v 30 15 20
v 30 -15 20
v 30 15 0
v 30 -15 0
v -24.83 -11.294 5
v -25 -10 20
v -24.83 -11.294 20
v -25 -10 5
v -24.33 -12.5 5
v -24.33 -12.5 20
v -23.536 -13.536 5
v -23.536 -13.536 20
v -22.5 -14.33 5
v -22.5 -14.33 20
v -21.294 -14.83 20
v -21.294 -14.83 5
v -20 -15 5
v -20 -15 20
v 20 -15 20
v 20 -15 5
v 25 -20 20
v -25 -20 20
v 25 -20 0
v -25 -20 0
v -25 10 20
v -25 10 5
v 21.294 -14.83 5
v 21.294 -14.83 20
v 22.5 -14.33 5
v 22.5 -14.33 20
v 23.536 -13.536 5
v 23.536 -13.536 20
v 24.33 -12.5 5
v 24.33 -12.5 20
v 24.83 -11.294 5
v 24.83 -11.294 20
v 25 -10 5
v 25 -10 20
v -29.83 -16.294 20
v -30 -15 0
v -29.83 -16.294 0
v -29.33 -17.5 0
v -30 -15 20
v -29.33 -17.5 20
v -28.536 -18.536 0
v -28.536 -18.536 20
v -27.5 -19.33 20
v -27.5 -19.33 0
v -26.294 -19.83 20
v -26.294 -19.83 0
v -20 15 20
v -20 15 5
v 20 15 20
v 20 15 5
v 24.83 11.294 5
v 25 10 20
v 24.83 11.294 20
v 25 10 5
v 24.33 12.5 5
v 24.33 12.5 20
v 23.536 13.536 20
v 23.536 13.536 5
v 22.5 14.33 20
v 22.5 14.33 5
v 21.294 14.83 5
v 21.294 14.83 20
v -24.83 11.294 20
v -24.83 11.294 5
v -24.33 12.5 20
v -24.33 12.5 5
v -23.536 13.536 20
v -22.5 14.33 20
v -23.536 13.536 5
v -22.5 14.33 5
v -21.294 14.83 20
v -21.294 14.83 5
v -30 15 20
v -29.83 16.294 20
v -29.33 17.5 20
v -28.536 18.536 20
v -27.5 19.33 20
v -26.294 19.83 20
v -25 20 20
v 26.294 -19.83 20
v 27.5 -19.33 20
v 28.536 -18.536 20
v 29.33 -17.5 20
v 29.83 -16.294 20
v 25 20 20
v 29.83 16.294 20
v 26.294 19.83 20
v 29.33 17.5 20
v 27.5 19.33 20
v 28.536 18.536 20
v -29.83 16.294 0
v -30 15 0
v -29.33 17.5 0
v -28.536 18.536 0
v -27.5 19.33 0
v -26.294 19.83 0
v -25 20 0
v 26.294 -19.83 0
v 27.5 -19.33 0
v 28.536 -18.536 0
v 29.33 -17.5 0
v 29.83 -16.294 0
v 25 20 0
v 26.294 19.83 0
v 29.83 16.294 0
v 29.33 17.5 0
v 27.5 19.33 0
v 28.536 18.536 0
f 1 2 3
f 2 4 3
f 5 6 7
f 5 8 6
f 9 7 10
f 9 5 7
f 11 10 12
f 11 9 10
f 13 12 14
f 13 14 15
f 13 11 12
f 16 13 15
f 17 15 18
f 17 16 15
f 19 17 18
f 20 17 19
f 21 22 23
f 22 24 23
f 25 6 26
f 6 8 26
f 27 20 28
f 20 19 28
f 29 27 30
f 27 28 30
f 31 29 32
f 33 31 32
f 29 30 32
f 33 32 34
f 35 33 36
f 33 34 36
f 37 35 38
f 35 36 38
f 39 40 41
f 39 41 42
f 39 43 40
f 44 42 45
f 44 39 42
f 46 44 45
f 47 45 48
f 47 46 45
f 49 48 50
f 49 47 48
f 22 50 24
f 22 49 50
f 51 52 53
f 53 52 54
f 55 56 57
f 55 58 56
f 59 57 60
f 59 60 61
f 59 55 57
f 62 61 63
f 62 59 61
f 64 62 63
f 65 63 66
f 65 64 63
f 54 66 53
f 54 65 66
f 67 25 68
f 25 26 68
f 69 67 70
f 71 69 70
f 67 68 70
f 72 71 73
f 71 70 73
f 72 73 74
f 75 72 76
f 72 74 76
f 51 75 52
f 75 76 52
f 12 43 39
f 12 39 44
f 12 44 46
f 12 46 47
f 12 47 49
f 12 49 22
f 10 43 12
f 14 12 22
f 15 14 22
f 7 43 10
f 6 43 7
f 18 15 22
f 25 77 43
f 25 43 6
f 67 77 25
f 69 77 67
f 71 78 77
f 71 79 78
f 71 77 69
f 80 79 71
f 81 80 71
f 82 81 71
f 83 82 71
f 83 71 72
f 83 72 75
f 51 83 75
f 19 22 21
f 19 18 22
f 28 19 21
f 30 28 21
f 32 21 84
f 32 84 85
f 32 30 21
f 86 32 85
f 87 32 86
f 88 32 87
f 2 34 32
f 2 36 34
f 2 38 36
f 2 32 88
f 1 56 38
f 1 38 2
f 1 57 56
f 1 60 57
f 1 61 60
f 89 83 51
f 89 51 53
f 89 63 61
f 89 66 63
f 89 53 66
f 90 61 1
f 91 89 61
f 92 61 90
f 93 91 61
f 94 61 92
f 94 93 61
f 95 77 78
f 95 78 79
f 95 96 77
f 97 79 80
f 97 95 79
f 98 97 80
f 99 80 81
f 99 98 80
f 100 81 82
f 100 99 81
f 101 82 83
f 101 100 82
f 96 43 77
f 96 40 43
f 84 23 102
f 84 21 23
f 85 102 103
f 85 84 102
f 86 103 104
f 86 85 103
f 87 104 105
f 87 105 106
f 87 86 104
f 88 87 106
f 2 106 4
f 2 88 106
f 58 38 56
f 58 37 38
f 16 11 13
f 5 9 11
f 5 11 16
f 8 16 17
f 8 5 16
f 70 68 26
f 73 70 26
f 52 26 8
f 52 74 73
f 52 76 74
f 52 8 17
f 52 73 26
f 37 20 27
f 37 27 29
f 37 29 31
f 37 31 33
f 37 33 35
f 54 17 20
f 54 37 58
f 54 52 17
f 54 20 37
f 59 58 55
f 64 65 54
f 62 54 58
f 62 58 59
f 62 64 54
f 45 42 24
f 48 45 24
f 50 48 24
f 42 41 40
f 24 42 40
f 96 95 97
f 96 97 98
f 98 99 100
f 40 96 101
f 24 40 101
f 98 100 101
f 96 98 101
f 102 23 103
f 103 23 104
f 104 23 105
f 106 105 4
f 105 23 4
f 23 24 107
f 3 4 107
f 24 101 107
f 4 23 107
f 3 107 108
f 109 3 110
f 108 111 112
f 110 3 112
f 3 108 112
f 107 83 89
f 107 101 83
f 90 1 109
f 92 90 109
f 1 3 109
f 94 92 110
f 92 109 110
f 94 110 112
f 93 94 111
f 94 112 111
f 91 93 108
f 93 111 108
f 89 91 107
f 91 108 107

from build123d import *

# Parameters (mm, degrees)
F0_W     = 60
F0_H     = 40
F1_DEPTH = 15
F2_DEPTH = 5
F3_T     = -5
F4_R     = 5


with BuildPart() as f1:
    # F0 (on Top) → F1 (new body)
    with BuildSketch(Plane.XY):
        Rectangle(F0_W, F0_H)
    extrude(amount=F1_DEPTH)

    # F2 (add): a face of the model
    f2_faces = [f1.faces().sort_by_distance(p)[0] for p in [
        (0, 0, 15),
    ]]
    extrude(f2_faces, amount=F2_DEPTH)

    # F3
    f3_openings = [f1.faces().sort_by_distance(p)[0] for p in [
        (0, 0, 20),
    ]]
    offset(amount=F3_T, openings=f3_openings)

    # F4
    f4_edges = [f1.edges().sort_by_distance(p)[0] for p in [
        (-30, 20, 10),
        (-30, -20, 10),
        (30, -20, 10),
        (30, 20, 10),
        (25, 15, 12.5),
        (-25, 15, 12.5),
        (25, -15, 12.5),
        (-25, -15, 12.5),
    ]]
    fillet(f4_edges, radius=F4_R)


solid = f1.part
